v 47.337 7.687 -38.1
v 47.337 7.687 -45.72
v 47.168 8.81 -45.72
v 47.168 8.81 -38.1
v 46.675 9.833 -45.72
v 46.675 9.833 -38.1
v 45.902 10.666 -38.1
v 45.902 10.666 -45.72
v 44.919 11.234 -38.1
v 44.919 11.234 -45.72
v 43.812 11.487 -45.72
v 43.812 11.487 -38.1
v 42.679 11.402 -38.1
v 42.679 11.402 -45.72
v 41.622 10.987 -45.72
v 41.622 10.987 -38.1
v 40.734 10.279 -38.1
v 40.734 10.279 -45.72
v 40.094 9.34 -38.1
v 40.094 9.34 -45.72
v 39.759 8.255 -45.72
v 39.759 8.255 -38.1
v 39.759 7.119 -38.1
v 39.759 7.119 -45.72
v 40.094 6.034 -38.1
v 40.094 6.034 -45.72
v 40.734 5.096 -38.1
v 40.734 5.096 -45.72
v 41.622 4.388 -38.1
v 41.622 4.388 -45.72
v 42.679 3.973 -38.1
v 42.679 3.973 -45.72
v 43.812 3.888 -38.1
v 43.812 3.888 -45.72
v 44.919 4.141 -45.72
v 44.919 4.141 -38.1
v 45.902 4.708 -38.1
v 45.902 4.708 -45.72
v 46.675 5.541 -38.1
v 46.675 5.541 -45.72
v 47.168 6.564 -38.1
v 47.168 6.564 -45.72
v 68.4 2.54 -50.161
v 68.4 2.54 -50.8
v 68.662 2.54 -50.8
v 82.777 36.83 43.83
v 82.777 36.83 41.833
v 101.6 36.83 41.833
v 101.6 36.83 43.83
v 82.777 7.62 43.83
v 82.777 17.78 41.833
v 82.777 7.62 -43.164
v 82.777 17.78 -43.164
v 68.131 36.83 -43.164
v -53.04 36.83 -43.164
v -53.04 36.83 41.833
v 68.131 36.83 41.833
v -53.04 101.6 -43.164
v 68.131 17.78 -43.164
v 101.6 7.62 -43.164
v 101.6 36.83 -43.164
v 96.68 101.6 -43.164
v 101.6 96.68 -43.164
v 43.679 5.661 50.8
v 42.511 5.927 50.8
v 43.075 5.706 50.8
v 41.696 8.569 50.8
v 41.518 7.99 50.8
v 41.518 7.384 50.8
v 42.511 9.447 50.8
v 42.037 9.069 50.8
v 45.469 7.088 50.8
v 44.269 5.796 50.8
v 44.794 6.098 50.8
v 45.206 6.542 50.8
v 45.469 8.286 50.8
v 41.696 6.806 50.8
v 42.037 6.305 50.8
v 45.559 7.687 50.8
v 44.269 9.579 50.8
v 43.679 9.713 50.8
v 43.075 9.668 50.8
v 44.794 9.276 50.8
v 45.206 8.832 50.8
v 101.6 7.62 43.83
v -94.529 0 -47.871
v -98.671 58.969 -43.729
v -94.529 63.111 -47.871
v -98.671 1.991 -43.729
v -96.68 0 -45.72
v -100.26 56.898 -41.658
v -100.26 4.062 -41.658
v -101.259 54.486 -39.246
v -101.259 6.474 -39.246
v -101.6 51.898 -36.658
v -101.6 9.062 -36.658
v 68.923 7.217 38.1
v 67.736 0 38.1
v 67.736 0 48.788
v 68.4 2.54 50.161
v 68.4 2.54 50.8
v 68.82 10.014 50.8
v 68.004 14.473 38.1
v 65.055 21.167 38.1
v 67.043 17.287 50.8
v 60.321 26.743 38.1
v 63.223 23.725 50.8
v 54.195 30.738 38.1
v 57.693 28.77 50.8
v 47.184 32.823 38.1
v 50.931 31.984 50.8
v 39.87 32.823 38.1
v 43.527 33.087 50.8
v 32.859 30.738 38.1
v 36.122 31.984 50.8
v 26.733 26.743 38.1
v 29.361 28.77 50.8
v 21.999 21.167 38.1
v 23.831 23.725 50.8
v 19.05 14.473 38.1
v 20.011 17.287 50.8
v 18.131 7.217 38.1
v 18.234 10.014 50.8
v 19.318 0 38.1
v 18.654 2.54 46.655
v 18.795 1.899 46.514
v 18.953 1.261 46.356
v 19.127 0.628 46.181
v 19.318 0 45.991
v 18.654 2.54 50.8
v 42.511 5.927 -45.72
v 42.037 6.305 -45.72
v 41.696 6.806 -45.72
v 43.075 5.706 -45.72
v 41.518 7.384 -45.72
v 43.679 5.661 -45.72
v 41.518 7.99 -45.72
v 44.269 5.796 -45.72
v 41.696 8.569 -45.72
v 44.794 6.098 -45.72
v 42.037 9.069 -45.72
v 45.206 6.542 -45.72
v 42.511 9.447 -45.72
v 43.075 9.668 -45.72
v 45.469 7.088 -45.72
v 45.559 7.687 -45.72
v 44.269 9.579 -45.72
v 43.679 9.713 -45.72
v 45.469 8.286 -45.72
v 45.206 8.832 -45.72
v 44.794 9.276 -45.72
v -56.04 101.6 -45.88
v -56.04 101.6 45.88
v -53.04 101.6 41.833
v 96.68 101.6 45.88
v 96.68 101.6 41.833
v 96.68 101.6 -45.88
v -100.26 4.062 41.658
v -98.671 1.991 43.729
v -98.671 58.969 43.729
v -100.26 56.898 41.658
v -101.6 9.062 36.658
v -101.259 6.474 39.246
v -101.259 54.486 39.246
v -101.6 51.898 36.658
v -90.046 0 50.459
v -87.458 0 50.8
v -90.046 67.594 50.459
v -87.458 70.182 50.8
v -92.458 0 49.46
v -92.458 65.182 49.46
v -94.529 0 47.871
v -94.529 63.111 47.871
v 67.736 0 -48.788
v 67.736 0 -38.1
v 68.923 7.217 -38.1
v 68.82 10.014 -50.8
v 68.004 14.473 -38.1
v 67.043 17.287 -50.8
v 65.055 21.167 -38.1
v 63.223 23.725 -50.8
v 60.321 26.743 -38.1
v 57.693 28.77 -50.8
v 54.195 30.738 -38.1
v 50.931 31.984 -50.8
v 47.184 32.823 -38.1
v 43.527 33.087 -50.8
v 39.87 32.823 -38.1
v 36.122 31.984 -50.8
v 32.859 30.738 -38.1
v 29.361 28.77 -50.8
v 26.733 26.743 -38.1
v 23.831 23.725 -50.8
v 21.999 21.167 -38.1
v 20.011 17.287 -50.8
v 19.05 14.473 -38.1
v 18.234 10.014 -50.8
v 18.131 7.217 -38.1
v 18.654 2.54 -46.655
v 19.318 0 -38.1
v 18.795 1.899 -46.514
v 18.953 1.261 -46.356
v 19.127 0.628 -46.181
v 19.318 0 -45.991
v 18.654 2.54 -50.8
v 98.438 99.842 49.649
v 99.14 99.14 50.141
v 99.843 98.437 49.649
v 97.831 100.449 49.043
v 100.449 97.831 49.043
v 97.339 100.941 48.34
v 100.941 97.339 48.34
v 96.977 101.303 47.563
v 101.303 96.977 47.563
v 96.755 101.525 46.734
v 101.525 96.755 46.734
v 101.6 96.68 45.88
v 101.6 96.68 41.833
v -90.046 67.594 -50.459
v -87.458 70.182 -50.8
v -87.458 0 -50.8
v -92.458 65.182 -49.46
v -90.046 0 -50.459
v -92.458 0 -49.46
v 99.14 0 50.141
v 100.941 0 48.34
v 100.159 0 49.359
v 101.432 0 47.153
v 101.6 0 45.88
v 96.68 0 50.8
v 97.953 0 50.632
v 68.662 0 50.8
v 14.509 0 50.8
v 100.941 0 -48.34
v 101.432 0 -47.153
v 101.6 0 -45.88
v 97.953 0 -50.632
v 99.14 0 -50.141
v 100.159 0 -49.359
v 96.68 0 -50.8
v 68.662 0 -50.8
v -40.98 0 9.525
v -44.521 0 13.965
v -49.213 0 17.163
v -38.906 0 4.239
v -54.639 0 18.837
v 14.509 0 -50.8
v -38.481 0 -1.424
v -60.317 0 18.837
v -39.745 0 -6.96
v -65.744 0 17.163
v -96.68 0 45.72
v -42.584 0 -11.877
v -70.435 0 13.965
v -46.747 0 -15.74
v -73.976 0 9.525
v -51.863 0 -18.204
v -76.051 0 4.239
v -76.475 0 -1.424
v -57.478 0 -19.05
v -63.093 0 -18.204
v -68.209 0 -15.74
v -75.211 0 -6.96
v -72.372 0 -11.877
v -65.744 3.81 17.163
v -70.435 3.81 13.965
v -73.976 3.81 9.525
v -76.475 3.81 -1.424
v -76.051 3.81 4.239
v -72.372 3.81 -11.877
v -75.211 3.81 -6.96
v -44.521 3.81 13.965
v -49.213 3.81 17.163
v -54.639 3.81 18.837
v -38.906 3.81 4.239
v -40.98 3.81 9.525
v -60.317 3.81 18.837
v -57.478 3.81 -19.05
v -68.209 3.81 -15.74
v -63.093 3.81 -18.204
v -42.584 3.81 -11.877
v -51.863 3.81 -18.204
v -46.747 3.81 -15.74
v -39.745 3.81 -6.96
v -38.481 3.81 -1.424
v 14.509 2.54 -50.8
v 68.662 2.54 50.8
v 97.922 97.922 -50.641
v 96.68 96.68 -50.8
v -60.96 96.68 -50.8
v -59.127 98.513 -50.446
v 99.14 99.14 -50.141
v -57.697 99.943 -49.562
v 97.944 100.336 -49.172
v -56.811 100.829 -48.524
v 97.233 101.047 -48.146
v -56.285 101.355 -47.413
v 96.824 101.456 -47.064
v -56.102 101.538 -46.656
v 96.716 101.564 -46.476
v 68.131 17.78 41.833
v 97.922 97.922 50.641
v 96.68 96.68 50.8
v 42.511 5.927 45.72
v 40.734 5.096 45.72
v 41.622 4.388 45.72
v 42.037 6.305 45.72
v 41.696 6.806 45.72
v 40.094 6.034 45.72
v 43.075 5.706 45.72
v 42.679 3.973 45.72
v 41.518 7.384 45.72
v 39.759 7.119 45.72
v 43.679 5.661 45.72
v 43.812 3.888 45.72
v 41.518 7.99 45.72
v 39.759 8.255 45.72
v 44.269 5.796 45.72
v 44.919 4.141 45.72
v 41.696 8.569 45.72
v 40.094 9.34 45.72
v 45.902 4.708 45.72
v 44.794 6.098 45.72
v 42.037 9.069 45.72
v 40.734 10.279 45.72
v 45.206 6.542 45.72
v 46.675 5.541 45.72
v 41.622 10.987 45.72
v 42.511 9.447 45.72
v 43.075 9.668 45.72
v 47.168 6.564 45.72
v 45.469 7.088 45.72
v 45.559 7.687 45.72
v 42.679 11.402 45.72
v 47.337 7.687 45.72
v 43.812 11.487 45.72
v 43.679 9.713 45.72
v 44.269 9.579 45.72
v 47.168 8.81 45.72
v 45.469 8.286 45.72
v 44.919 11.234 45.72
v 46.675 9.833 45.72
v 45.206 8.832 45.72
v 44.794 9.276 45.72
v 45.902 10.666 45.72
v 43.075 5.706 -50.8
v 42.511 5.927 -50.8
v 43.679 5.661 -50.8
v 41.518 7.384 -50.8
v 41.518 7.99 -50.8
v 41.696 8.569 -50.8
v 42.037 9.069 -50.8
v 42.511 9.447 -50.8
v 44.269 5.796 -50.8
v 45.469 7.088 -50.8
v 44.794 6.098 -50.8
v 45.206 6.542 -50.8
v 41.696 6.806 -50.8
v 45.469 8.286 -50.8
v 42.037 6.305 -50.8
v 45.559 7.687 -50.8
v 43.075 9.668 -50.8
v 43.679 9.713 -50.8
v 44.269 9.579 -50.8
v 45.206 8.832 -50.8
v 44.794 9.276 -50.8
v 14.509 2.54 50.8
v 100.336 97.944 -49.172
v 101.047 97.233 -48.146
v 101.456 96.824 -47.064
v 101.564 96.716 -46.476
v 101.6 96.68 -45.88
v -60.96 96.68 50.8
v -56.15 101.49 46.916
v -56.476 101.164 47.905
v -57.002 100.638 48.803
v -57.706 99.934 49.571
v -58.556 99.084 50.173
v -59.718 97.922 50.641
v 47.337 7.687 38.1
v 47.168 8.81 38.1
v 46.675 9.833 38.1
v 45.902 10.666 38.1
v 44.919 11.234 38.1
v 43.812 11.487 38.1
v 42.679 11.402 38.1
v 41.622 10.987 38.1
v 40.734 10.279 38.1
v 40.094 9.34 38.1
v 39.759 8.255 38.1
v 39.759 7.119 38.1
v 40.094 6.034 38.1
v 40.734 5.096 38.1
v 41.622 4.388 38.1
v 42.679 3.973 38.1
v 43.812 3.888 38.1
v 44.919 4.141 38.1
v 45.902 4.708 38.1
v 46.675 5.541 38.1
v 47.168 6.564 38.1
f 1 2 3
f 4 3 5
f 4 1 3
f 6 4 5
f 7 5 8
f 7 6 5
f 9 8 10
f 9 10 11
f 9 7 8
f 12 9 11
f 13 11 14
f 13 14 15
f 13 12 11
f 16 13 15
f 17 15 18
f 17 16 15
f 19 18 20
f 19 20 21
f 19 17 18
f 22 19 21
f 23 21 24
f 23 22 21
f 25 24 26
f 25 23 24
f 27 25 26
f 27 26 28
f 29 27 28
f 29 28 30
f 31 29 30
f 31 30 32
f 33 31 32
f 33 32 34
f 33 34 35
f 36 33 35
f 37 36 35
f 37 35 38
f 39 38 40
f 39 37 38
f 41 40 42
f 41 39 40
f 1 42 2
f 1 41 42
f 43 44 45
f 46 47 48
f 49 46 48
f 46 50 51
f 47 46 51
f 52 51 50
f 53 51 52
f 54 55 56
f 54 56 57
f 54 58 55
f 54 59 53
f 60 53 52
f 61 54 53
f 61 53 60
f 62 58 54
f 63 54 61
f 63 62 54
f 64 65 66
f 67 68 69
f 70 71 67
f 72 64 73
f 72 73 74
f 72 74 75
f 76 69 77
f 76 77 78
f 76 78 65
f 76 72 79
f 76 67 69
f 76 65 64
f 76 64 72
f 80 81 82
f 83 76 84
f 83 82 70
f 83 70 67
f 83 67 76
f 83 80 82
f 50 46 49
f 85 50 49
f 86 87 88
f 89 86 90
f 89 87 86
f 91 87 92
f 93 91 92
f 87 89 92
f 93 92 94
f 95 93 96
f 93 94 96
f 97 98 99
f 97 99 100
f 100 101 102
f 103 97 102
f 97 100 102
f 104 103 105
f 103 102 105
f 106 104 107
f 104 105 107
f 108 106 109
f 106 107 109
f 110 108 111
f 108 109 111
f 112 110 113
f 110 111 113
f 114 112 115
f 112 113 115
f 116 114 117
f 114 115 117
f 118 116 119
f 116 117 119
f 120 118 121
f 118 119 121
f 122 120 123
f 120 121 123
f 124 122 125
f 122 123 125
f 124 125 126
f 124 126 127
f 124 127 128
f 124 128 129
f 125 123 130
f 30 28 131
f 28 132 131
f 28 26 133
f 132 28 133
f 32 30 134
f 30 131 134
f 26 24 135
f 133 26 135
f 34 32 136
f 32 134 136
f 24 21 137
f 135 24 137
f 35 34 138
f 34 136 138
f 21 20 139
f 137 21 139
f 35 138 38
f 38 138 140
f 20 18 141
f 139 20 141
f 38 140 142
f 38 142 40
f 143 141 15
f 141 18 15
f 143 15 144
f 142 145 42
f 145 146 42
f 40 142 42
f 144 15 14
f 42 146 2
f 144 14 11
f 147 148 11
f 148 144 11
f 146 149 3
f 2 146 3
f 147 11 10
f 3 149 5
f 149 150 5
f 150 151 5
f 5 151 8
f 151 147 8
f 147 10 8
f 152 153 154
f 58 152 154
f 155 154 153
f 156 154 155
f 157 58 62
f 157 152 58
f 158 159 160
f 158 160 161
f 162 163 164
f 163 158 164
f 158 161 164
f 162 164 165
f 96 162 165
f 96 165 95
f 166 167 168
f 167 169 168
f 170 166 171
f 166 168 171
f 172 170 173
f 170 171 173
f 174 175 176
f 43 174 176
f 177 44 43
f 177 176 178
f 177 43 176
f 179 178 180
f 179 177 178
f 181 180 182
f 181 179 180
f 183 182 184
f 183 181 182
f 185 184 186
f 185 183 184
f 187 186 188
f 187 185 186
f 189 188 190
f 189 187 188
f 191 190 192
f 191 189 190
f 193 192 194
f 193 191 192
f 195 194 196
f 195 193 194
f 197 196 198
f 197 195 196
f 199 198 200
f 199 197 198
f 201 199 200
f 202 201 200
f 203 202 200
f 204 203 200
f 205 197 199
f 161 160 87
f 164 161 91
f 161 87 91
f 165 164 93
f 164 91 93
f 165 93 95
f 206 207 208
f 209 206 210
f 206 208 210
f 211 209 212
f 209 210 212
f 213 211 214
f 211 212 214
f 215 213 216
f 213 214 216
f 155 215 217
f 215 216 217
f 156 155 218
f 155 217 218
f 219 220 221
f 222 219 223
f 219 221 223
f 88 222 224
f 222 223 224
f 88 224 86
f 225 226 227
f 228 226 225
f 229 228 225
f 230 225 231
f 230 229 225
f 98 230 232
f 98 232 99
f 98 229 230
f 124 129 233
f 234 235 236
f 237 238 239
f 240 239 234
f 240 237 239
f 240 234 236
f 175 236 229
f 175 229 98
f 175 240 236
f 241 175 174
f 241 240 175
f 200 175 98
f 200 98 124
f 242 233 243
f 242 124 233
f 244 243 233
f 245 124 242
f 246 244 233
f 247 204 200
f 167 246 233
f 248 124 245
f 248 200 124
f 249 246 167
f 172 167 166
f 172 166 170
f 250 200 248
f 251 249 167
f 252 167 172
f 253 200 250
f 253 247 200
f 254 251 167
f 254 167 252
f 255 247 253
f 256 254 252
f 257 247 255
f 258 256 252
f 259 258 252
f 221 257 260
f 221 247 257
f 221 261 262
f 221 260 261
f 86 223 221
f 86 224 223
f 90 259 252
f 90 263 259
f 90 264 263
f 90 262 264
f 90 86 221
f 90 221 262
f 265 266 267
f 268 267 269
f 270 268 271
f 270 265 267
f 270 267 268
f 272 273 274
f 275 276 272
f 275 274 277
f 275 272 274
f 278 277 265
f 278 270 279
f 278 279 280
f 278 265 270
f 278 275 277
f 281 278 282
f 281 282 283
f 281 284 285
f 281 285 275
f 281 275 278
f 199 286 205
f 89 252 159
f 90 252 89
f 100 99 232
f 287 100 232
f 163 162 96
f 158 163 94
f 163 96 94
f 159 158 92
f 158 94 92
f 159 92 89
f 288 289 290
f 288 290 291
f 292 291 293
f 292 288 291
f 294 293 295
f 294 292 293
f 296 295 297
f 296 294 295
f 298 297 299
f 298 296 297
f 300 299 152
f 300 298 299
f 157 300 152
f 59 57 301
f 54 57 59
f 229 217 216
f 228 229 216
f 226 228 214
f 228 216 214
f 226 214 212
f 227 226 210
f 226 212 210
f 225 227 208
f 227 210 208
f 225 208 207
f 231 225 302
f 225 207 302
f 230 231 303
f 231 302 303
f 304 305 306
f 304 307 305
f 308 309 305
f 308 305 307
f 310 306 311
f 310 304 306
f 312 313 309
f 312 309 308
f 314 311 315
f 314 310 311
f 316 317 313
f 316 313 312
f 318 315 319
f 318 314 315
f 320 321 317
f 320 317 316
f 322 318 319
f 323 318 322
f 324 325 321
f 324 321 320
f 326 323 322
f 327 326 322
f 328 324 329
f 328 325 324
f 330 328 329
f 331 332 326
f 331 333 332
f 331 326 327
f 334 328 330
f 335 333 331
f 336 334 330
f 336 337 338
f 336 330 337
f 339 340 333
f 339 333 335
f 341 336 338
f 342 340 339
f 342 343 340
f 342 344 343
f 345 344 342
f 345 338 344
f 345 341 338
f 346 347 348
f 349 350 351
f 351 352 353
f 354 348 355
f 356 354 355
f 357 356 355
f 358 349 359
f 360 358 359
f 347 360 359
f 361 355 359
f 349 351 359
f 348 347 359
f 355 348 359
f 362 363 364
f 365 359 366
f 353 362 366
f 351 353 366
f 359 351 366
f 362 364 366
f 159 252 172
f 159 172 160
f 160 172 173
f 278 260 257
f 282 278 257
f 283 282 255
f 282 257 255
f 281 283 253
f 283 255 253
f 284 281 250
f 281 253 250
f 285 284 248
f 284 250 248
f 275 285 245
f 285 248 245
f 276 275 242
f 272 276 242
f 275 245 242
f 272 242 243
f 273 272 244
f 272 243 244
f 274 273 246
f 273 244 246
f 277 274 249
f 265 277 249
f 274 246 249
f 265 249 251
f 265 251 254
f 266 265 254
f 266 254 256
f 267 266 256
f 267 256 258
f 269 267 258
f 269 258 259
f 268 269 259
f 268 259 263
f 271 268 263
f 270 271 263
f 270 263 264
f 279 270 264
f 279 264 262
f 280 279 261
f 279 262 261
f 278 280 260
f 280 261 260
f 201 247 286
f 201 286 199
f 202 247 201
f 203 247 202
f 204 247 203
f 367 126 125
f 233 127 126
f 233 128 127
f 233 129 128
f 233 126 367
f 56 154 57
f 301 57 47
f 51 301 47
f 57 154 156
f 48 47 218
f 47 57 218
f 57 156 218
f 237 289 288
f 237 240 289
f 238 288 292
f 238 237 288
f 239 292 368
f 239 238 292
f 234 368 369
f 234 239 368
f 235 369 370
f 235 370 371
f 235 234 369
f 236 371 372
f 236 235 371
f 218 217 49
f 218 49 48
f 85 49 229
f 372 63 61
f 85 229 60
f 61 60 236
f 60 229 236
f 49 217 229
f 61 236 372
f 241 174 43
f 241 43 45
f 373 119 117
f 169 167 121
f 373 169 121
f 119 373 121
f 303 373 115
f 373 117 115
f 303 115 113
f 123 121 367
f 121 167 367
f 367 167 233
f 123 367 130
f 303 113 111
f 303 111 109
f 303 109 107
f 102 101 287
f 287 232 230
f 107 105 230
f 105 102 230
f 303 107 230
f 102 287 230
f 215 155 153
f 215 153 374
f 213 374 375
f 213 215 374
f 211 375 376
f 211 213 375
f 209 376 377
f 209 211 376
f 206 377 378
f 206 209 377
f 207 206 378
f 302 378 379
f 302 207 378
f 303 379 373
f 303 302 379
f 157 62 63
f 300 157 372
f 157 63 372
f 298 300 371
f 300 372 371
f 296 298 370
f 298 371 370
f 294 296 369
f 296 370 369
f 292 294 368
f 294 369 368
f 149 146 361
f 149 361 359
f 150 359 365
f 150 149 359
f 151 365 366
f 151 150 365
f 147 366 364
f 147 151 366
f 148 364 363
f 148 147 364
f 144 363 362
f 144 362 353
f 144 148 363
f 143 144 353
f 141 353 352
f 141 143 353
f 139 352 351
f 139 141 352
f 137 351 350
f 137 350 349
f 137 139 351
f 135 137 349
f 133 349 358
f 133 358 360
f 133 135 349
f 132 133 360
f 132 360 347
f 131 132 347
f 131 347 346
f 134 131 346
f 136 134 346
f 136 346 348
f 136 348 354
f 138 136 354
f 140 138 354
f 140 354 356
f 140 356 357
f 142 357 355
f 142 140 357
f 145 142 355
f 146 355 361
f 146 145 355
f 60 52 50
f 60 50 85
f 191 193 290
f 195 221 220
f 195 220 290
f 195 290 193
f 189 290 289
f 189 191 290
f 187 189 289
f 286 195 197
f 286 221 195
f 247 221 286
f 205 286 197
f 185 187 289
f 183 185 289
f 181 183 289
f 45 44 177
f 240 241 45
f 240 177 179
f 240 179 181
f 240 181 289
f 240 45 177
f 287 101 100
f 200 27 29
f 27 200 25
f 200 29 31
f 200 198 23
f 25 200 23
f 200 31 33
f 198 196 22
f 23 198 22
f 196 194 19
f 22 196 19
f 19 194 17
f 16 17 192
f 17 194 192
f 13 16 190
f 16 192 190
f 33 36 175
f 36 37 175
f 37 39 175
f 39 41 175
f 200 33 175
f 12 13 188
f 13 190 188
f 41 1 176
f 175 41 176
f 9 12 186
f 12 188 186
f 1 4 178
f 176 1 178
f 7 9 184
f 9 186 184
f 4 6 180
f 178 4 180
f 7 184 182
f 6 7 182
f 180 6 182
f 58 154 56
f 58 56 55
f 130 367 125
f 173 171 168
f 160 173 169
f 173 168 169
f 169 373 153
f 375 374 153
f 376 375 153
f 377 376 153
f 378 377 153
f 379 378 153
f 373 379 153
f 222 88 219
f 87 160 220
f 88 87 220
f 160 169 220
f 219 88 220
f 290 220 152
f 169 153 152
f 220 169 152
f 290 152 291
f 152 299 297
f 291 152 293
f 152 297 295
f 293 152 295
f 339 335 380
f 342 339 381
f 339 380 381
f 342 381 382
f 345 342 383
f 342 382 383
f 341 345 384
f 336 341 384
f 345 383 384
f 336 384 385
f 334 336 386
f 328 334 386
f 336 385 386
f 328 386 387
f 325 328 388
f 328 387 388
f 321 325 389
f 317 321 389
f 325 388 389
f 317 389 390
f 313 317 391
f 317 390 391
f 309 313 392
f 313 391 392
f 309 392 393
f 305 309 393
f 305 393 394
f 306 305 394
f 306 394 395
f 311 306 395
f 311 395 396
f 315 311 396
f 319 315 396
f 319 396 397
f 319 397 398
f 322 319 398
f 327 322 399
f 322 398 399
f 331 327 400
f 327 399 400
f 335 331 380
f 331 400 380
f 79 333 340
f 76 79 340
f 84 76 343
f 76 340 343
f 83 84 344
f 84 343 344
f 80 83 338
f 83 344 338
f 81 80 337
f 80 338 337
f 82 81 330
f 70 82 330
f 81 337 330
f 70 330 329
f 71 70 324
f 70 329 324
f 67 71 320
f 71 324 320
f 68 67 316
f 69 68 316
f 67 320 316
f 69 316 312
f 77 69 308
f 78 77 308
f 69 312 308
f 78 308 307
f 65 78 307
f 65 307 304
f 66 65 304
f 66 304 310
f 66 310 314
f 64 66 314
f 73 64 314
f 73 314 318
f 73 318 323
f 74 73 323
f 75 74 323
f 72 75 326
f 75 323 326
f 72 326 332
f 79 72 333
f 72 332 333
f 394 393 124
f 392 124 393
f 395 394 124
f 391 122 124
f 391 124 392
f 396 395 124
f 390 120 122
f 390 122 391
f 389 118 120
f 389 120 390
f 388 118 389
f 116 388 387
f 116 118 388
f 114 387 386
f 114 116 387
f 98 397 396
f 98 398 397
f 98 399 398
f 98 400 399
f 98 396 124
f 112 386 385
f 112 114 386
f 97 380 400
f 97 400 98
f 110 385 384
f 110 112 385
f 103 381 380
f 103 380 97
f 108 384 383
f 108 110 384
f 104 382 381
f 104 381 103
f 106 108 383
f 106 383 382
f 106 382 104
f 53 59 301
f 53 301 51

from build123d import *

# Parameters (mm, degrees)
BOSS_EXTRUDE1_DEPTH = 2.54
SKETCH2_W           = 203.2
SKETCH2_H           = 101.6
BOSS_EXTRUDE2_DEPTH = 99.06
CHAMFER2_SIZE       = 45.56
CHAMFER3_SIZE       = 4.92
CHAMFER4_SIZE       = 4.92
FILLET1_R           = 4.92
FILLET3_R           = 4.92
CHAMFER5_SIZE       = 10
FILLET4_R           = 10
SKETCH4_R           = 25.4
CUT_EXTRUDE1_DEPTH  = 12.7
SKETCH5_R           = 3.81
BOSS_EXTRUDE3_DEPTH = 7.62
SKETCH7_R           = 2.032
BOSS_EXTRUDE4_DEPTH = 5.08
SKETCH8_R           = 19.05
CUT_EXTRUDE2_DEPTH  = 3.81
SKETCH9_W           = 185.084164058
SKETCH9_H           = 84.996684453
CUT_EXTRUDE3_DEPTH  = 64.77
SKETCH10_W          = 37.50506442
SKETCH10_H          = 86.993995576
CUT_EXTRUDE4_DEPTH  = 29.21
SKETCH11_W          = 25.743121139
SKETCH11_H          = 84.996684453
CUT_EXTRUDE5_DEPTH  = 19.05


with BuildPart() as part:
    # Sketch1 → Boss-Extrude1 (new body)
    with BuildSketch(Plane(origin=(0, 0, 0), x_dir=(1, 0, 0), z_dir=(0, 1, 0))):
        with BuildLine():
            Line((14.508978226, 50.8), (22.487986765, 42.820991461))
            Line((22.487986765, 42.820991461), (37.396380497, 42.820991461))
            Line((37.396380497, 42.820991461), (37.396380497, 38.724667236))
            Line((37.396380497, 38.724667236), (49.657488857, 38.724667236))
            Line((49.657488857, 38.724667236), (49.657488857, 42.820991461))
            Line((49.657488857, 42.820991461), (57.422857485, 42.820991461))
            add(Edge.make_bspline(
                [(57.422857485, 42.820991461), (65.475972879, 42.629610348), (68.662206814, 50.8)],
                knots=[0, 0, 0, 1, 1, 1], degree=2))
            Line((68.662206814, 50.8), (101.6, 50.8))
            Line((101.6, 50.8), (101.6, -50.8))
            Line((101.6, -50.8), (68.662206814, -50.8))
            add(Edge.make_bspline(
                [(57.422857485, -42.820991461), (65.475972879, -42.629610348), (68.662206814, -50.8)],
                knots=[0, 0, 0, 1, 1, 1], degree=2))
            Line((57.422857485, -42.820991461), (49.657488857, -42.820991461))
            Line((49.657488857, -42.820991461), (49.657488857, -38.724667236))
            Line((49.657488857, -38.724667236), (37.396380497, -38.724667236))
            Line((37.396380497, -38.724667236), (37.396380497, -42.820991461))
            Line((37.396380497, -42.820991461), (22.487986765, -42.820991461))
            Line((22.487986765, -42.820991461), (14.508978226, -50.8))
            Line((14.508978226, -50.8), (-101.6, -50.8))
            Line((-101.6, -50.8), (-101.6, 50.8))
            Line((-101.6, 50.8), (14.508978226, 50.8))
        make_face()
    extrude(amount=BOSS_EXTRUDE1_DEPTH)

    # Sketch2 → Boss-Extrude2 (add)
    with BuildSketch(Plane(origin=(0, 2.54, 0), x_dir=(1, 0, 0), z_dir=(0, 1, 0))):
        Rectangle(SKETCH2_W, SKETCH2_H)
    extrude(amount=BOSS_EXTRUDE2_DEPTH)

    # Chamfer2
    chamfer2_edges = [part.edges().sort_by_distance(p)[0] for p in [
        (-101.6, 101.6, 0),
    ]]
    chamfer(chamfer2_edges, length=CHAMFER2_SIZE)

    # Chamfer3
    chamfer3_edges = [part.edges().sort_by_distance(p)[0] for p in [
        (101.6, 101.6, 0),
    ]]
    chamfer(chamfer3_edges, length=CHAMFER3_SIZE)

    # Chamfer4
    chamfer4_edges = [part.edges().sort_by_distance(p)[0] for p in [
        (-101.6, 0, 0),
    ]]
    chamfer(chamfer4_edges, length=CHAMFER4_SIZE)

    # Fillet1
    fillet1_edges = [part.edges().sort_by_distance(p)[0] for p in [
        (20.32, 101.6, -50.8),
        (20.32, 101.6, 50.8),
    ]]
    fillet(fillet1_edges, radius=FILLET1_R)

    # Fillet3
    fillet3_edges = [part.edges().sort_by_distance(p)[0] for p in [
        (101.6, 48.34, 50.8),
        (101.6, 48.34, -50.8),
    ]]
    fillet(fillet3_edges, radius=FILLET3_R - 0.0001)  # a hair under: the kernel refuses the full size

    # Chamfer5
    chamfer5_edges = [part.edges().sort_by_distance(p)[0] for p in [
        (-101.6, 30.48, -50.8),
        (-101.6, 30.48, 50.8),
    ]]
    chamfer(chamfer5_edges, length=CHAMFER5_SIZE)

    # Fillet4
    fillet4_edges = [part.edges().sort_by_distance(p)[0] for p in [
        (-101.6, 4.92, 0),
        (-101.6, 56.04, 0),
        (-101.6, 30.48, 40.8),
        (-101.6, 30.48, -40.8),
        (-91.6, 33.02, -50.8),
        (-91.6, 33.02, 50.8),
    ]]
    fillet(fillet4_edges, radius=FILLET4_R)

    # Sketch4 → Cut-Extrude1 (cut)
    with BuildSketch(Plane.XY.offset(50.8)):
        with Locations((43.526934677, 7.68715588)):
            Circle(SKETCH4_R)
    cut_extrude1 = extrude(amount=-CUT_EXTRUDE1_DEPTH, mode=Mode.SUBTRACT)

    # Mirror1: Cut-Extrude1 across plane
    add(cut_extrude1.mirror(Plane.XY), mode=Mode.SUBTRACT)

    # Sketch5 → Boss-Extrude3 (add)
    with BuildSketch(Plane.XY.offset(38.1)):
        with Locations((43.526934677, 7.68715588)):
            Circle(SKETCH5_R)
    boss_extrude3 = extrude(amount=BOSS_EXTRUDE3_DEPTH)

    # Mirror2: Boss-Extrude3 across plane
    add(boss_extrude3.mirror(Plane.XY))

    # Sketch7 → Boss-Extrude4 (add)
    with BuildSketch(Plane.XY.offset(45.72)):
        with Locations((43.526934677, 7.68715588)):
            Circle(SKETCH7_R)
    boss_extrude4 = extrude(amount=BOSS_EXTRUDE4_DEPTH)

    # Mirror3: Boss-Extrude4 across plane
    add(boss_extrude4.mirror(Plane.XY))

    # Sketch8 → Cut-Extrude2 (cut)
    with BuildSketch(Plane.XZ):
        with Locations(Location((-57.478175649, 0, 0), (0, 0, 270))):
            Circle(SKETCH8_R)
    extrude(amount=-CUT_EXTRUDE2_DEPTH, mode=Mode.SUBTRACT)

    # Sketch9 → Cut-Extrude3 (cut)
    with BuildSketch(Plane(origin=(0, 101.6, 0), x_dir=(1, 0, 0), z_dir=(0, 1, 0))):
        with Locations((39.502375542, 0.665770374)):
            Rectangle(SKETCH9_W, SKETCH9_H)
    extrude(amount=-CUT_EXTRUDE3_DEPTH, mode=Mode.SUBTRACT)

    # Sketch10 → Cut-Extrude4 (cut)
    with BuildSketch(Plane(origin=(0, 36.83, 0), x_dir=(1, 0, 0), z_dir=(0, 1, 0))):
        with Locations((101.529982082, -0.332885187)):
            Rectangle(SKETCH10_W, SKETCH10_H)
    extrude(amount=-CUT_EXTRUDE4_DEPTH, mode=Mode.SUBTRACT)

    # Sketch11 → Cut-Extrude5 (cut)
    with BuildSketch(Plane(origin=(0, 36.83, 0), x_dir=(1, 0, 0), z_dir=(0, 1, 0))):
        with Locations((81.002062208, 0.665770374)):
            Rectangle(SKETCH11_W, SKETCH11_H)
    extrude(amount=-CUT_EXTRUDE5_DEPTH, mode=Mode.SUBTRACT)


solid = part.part
